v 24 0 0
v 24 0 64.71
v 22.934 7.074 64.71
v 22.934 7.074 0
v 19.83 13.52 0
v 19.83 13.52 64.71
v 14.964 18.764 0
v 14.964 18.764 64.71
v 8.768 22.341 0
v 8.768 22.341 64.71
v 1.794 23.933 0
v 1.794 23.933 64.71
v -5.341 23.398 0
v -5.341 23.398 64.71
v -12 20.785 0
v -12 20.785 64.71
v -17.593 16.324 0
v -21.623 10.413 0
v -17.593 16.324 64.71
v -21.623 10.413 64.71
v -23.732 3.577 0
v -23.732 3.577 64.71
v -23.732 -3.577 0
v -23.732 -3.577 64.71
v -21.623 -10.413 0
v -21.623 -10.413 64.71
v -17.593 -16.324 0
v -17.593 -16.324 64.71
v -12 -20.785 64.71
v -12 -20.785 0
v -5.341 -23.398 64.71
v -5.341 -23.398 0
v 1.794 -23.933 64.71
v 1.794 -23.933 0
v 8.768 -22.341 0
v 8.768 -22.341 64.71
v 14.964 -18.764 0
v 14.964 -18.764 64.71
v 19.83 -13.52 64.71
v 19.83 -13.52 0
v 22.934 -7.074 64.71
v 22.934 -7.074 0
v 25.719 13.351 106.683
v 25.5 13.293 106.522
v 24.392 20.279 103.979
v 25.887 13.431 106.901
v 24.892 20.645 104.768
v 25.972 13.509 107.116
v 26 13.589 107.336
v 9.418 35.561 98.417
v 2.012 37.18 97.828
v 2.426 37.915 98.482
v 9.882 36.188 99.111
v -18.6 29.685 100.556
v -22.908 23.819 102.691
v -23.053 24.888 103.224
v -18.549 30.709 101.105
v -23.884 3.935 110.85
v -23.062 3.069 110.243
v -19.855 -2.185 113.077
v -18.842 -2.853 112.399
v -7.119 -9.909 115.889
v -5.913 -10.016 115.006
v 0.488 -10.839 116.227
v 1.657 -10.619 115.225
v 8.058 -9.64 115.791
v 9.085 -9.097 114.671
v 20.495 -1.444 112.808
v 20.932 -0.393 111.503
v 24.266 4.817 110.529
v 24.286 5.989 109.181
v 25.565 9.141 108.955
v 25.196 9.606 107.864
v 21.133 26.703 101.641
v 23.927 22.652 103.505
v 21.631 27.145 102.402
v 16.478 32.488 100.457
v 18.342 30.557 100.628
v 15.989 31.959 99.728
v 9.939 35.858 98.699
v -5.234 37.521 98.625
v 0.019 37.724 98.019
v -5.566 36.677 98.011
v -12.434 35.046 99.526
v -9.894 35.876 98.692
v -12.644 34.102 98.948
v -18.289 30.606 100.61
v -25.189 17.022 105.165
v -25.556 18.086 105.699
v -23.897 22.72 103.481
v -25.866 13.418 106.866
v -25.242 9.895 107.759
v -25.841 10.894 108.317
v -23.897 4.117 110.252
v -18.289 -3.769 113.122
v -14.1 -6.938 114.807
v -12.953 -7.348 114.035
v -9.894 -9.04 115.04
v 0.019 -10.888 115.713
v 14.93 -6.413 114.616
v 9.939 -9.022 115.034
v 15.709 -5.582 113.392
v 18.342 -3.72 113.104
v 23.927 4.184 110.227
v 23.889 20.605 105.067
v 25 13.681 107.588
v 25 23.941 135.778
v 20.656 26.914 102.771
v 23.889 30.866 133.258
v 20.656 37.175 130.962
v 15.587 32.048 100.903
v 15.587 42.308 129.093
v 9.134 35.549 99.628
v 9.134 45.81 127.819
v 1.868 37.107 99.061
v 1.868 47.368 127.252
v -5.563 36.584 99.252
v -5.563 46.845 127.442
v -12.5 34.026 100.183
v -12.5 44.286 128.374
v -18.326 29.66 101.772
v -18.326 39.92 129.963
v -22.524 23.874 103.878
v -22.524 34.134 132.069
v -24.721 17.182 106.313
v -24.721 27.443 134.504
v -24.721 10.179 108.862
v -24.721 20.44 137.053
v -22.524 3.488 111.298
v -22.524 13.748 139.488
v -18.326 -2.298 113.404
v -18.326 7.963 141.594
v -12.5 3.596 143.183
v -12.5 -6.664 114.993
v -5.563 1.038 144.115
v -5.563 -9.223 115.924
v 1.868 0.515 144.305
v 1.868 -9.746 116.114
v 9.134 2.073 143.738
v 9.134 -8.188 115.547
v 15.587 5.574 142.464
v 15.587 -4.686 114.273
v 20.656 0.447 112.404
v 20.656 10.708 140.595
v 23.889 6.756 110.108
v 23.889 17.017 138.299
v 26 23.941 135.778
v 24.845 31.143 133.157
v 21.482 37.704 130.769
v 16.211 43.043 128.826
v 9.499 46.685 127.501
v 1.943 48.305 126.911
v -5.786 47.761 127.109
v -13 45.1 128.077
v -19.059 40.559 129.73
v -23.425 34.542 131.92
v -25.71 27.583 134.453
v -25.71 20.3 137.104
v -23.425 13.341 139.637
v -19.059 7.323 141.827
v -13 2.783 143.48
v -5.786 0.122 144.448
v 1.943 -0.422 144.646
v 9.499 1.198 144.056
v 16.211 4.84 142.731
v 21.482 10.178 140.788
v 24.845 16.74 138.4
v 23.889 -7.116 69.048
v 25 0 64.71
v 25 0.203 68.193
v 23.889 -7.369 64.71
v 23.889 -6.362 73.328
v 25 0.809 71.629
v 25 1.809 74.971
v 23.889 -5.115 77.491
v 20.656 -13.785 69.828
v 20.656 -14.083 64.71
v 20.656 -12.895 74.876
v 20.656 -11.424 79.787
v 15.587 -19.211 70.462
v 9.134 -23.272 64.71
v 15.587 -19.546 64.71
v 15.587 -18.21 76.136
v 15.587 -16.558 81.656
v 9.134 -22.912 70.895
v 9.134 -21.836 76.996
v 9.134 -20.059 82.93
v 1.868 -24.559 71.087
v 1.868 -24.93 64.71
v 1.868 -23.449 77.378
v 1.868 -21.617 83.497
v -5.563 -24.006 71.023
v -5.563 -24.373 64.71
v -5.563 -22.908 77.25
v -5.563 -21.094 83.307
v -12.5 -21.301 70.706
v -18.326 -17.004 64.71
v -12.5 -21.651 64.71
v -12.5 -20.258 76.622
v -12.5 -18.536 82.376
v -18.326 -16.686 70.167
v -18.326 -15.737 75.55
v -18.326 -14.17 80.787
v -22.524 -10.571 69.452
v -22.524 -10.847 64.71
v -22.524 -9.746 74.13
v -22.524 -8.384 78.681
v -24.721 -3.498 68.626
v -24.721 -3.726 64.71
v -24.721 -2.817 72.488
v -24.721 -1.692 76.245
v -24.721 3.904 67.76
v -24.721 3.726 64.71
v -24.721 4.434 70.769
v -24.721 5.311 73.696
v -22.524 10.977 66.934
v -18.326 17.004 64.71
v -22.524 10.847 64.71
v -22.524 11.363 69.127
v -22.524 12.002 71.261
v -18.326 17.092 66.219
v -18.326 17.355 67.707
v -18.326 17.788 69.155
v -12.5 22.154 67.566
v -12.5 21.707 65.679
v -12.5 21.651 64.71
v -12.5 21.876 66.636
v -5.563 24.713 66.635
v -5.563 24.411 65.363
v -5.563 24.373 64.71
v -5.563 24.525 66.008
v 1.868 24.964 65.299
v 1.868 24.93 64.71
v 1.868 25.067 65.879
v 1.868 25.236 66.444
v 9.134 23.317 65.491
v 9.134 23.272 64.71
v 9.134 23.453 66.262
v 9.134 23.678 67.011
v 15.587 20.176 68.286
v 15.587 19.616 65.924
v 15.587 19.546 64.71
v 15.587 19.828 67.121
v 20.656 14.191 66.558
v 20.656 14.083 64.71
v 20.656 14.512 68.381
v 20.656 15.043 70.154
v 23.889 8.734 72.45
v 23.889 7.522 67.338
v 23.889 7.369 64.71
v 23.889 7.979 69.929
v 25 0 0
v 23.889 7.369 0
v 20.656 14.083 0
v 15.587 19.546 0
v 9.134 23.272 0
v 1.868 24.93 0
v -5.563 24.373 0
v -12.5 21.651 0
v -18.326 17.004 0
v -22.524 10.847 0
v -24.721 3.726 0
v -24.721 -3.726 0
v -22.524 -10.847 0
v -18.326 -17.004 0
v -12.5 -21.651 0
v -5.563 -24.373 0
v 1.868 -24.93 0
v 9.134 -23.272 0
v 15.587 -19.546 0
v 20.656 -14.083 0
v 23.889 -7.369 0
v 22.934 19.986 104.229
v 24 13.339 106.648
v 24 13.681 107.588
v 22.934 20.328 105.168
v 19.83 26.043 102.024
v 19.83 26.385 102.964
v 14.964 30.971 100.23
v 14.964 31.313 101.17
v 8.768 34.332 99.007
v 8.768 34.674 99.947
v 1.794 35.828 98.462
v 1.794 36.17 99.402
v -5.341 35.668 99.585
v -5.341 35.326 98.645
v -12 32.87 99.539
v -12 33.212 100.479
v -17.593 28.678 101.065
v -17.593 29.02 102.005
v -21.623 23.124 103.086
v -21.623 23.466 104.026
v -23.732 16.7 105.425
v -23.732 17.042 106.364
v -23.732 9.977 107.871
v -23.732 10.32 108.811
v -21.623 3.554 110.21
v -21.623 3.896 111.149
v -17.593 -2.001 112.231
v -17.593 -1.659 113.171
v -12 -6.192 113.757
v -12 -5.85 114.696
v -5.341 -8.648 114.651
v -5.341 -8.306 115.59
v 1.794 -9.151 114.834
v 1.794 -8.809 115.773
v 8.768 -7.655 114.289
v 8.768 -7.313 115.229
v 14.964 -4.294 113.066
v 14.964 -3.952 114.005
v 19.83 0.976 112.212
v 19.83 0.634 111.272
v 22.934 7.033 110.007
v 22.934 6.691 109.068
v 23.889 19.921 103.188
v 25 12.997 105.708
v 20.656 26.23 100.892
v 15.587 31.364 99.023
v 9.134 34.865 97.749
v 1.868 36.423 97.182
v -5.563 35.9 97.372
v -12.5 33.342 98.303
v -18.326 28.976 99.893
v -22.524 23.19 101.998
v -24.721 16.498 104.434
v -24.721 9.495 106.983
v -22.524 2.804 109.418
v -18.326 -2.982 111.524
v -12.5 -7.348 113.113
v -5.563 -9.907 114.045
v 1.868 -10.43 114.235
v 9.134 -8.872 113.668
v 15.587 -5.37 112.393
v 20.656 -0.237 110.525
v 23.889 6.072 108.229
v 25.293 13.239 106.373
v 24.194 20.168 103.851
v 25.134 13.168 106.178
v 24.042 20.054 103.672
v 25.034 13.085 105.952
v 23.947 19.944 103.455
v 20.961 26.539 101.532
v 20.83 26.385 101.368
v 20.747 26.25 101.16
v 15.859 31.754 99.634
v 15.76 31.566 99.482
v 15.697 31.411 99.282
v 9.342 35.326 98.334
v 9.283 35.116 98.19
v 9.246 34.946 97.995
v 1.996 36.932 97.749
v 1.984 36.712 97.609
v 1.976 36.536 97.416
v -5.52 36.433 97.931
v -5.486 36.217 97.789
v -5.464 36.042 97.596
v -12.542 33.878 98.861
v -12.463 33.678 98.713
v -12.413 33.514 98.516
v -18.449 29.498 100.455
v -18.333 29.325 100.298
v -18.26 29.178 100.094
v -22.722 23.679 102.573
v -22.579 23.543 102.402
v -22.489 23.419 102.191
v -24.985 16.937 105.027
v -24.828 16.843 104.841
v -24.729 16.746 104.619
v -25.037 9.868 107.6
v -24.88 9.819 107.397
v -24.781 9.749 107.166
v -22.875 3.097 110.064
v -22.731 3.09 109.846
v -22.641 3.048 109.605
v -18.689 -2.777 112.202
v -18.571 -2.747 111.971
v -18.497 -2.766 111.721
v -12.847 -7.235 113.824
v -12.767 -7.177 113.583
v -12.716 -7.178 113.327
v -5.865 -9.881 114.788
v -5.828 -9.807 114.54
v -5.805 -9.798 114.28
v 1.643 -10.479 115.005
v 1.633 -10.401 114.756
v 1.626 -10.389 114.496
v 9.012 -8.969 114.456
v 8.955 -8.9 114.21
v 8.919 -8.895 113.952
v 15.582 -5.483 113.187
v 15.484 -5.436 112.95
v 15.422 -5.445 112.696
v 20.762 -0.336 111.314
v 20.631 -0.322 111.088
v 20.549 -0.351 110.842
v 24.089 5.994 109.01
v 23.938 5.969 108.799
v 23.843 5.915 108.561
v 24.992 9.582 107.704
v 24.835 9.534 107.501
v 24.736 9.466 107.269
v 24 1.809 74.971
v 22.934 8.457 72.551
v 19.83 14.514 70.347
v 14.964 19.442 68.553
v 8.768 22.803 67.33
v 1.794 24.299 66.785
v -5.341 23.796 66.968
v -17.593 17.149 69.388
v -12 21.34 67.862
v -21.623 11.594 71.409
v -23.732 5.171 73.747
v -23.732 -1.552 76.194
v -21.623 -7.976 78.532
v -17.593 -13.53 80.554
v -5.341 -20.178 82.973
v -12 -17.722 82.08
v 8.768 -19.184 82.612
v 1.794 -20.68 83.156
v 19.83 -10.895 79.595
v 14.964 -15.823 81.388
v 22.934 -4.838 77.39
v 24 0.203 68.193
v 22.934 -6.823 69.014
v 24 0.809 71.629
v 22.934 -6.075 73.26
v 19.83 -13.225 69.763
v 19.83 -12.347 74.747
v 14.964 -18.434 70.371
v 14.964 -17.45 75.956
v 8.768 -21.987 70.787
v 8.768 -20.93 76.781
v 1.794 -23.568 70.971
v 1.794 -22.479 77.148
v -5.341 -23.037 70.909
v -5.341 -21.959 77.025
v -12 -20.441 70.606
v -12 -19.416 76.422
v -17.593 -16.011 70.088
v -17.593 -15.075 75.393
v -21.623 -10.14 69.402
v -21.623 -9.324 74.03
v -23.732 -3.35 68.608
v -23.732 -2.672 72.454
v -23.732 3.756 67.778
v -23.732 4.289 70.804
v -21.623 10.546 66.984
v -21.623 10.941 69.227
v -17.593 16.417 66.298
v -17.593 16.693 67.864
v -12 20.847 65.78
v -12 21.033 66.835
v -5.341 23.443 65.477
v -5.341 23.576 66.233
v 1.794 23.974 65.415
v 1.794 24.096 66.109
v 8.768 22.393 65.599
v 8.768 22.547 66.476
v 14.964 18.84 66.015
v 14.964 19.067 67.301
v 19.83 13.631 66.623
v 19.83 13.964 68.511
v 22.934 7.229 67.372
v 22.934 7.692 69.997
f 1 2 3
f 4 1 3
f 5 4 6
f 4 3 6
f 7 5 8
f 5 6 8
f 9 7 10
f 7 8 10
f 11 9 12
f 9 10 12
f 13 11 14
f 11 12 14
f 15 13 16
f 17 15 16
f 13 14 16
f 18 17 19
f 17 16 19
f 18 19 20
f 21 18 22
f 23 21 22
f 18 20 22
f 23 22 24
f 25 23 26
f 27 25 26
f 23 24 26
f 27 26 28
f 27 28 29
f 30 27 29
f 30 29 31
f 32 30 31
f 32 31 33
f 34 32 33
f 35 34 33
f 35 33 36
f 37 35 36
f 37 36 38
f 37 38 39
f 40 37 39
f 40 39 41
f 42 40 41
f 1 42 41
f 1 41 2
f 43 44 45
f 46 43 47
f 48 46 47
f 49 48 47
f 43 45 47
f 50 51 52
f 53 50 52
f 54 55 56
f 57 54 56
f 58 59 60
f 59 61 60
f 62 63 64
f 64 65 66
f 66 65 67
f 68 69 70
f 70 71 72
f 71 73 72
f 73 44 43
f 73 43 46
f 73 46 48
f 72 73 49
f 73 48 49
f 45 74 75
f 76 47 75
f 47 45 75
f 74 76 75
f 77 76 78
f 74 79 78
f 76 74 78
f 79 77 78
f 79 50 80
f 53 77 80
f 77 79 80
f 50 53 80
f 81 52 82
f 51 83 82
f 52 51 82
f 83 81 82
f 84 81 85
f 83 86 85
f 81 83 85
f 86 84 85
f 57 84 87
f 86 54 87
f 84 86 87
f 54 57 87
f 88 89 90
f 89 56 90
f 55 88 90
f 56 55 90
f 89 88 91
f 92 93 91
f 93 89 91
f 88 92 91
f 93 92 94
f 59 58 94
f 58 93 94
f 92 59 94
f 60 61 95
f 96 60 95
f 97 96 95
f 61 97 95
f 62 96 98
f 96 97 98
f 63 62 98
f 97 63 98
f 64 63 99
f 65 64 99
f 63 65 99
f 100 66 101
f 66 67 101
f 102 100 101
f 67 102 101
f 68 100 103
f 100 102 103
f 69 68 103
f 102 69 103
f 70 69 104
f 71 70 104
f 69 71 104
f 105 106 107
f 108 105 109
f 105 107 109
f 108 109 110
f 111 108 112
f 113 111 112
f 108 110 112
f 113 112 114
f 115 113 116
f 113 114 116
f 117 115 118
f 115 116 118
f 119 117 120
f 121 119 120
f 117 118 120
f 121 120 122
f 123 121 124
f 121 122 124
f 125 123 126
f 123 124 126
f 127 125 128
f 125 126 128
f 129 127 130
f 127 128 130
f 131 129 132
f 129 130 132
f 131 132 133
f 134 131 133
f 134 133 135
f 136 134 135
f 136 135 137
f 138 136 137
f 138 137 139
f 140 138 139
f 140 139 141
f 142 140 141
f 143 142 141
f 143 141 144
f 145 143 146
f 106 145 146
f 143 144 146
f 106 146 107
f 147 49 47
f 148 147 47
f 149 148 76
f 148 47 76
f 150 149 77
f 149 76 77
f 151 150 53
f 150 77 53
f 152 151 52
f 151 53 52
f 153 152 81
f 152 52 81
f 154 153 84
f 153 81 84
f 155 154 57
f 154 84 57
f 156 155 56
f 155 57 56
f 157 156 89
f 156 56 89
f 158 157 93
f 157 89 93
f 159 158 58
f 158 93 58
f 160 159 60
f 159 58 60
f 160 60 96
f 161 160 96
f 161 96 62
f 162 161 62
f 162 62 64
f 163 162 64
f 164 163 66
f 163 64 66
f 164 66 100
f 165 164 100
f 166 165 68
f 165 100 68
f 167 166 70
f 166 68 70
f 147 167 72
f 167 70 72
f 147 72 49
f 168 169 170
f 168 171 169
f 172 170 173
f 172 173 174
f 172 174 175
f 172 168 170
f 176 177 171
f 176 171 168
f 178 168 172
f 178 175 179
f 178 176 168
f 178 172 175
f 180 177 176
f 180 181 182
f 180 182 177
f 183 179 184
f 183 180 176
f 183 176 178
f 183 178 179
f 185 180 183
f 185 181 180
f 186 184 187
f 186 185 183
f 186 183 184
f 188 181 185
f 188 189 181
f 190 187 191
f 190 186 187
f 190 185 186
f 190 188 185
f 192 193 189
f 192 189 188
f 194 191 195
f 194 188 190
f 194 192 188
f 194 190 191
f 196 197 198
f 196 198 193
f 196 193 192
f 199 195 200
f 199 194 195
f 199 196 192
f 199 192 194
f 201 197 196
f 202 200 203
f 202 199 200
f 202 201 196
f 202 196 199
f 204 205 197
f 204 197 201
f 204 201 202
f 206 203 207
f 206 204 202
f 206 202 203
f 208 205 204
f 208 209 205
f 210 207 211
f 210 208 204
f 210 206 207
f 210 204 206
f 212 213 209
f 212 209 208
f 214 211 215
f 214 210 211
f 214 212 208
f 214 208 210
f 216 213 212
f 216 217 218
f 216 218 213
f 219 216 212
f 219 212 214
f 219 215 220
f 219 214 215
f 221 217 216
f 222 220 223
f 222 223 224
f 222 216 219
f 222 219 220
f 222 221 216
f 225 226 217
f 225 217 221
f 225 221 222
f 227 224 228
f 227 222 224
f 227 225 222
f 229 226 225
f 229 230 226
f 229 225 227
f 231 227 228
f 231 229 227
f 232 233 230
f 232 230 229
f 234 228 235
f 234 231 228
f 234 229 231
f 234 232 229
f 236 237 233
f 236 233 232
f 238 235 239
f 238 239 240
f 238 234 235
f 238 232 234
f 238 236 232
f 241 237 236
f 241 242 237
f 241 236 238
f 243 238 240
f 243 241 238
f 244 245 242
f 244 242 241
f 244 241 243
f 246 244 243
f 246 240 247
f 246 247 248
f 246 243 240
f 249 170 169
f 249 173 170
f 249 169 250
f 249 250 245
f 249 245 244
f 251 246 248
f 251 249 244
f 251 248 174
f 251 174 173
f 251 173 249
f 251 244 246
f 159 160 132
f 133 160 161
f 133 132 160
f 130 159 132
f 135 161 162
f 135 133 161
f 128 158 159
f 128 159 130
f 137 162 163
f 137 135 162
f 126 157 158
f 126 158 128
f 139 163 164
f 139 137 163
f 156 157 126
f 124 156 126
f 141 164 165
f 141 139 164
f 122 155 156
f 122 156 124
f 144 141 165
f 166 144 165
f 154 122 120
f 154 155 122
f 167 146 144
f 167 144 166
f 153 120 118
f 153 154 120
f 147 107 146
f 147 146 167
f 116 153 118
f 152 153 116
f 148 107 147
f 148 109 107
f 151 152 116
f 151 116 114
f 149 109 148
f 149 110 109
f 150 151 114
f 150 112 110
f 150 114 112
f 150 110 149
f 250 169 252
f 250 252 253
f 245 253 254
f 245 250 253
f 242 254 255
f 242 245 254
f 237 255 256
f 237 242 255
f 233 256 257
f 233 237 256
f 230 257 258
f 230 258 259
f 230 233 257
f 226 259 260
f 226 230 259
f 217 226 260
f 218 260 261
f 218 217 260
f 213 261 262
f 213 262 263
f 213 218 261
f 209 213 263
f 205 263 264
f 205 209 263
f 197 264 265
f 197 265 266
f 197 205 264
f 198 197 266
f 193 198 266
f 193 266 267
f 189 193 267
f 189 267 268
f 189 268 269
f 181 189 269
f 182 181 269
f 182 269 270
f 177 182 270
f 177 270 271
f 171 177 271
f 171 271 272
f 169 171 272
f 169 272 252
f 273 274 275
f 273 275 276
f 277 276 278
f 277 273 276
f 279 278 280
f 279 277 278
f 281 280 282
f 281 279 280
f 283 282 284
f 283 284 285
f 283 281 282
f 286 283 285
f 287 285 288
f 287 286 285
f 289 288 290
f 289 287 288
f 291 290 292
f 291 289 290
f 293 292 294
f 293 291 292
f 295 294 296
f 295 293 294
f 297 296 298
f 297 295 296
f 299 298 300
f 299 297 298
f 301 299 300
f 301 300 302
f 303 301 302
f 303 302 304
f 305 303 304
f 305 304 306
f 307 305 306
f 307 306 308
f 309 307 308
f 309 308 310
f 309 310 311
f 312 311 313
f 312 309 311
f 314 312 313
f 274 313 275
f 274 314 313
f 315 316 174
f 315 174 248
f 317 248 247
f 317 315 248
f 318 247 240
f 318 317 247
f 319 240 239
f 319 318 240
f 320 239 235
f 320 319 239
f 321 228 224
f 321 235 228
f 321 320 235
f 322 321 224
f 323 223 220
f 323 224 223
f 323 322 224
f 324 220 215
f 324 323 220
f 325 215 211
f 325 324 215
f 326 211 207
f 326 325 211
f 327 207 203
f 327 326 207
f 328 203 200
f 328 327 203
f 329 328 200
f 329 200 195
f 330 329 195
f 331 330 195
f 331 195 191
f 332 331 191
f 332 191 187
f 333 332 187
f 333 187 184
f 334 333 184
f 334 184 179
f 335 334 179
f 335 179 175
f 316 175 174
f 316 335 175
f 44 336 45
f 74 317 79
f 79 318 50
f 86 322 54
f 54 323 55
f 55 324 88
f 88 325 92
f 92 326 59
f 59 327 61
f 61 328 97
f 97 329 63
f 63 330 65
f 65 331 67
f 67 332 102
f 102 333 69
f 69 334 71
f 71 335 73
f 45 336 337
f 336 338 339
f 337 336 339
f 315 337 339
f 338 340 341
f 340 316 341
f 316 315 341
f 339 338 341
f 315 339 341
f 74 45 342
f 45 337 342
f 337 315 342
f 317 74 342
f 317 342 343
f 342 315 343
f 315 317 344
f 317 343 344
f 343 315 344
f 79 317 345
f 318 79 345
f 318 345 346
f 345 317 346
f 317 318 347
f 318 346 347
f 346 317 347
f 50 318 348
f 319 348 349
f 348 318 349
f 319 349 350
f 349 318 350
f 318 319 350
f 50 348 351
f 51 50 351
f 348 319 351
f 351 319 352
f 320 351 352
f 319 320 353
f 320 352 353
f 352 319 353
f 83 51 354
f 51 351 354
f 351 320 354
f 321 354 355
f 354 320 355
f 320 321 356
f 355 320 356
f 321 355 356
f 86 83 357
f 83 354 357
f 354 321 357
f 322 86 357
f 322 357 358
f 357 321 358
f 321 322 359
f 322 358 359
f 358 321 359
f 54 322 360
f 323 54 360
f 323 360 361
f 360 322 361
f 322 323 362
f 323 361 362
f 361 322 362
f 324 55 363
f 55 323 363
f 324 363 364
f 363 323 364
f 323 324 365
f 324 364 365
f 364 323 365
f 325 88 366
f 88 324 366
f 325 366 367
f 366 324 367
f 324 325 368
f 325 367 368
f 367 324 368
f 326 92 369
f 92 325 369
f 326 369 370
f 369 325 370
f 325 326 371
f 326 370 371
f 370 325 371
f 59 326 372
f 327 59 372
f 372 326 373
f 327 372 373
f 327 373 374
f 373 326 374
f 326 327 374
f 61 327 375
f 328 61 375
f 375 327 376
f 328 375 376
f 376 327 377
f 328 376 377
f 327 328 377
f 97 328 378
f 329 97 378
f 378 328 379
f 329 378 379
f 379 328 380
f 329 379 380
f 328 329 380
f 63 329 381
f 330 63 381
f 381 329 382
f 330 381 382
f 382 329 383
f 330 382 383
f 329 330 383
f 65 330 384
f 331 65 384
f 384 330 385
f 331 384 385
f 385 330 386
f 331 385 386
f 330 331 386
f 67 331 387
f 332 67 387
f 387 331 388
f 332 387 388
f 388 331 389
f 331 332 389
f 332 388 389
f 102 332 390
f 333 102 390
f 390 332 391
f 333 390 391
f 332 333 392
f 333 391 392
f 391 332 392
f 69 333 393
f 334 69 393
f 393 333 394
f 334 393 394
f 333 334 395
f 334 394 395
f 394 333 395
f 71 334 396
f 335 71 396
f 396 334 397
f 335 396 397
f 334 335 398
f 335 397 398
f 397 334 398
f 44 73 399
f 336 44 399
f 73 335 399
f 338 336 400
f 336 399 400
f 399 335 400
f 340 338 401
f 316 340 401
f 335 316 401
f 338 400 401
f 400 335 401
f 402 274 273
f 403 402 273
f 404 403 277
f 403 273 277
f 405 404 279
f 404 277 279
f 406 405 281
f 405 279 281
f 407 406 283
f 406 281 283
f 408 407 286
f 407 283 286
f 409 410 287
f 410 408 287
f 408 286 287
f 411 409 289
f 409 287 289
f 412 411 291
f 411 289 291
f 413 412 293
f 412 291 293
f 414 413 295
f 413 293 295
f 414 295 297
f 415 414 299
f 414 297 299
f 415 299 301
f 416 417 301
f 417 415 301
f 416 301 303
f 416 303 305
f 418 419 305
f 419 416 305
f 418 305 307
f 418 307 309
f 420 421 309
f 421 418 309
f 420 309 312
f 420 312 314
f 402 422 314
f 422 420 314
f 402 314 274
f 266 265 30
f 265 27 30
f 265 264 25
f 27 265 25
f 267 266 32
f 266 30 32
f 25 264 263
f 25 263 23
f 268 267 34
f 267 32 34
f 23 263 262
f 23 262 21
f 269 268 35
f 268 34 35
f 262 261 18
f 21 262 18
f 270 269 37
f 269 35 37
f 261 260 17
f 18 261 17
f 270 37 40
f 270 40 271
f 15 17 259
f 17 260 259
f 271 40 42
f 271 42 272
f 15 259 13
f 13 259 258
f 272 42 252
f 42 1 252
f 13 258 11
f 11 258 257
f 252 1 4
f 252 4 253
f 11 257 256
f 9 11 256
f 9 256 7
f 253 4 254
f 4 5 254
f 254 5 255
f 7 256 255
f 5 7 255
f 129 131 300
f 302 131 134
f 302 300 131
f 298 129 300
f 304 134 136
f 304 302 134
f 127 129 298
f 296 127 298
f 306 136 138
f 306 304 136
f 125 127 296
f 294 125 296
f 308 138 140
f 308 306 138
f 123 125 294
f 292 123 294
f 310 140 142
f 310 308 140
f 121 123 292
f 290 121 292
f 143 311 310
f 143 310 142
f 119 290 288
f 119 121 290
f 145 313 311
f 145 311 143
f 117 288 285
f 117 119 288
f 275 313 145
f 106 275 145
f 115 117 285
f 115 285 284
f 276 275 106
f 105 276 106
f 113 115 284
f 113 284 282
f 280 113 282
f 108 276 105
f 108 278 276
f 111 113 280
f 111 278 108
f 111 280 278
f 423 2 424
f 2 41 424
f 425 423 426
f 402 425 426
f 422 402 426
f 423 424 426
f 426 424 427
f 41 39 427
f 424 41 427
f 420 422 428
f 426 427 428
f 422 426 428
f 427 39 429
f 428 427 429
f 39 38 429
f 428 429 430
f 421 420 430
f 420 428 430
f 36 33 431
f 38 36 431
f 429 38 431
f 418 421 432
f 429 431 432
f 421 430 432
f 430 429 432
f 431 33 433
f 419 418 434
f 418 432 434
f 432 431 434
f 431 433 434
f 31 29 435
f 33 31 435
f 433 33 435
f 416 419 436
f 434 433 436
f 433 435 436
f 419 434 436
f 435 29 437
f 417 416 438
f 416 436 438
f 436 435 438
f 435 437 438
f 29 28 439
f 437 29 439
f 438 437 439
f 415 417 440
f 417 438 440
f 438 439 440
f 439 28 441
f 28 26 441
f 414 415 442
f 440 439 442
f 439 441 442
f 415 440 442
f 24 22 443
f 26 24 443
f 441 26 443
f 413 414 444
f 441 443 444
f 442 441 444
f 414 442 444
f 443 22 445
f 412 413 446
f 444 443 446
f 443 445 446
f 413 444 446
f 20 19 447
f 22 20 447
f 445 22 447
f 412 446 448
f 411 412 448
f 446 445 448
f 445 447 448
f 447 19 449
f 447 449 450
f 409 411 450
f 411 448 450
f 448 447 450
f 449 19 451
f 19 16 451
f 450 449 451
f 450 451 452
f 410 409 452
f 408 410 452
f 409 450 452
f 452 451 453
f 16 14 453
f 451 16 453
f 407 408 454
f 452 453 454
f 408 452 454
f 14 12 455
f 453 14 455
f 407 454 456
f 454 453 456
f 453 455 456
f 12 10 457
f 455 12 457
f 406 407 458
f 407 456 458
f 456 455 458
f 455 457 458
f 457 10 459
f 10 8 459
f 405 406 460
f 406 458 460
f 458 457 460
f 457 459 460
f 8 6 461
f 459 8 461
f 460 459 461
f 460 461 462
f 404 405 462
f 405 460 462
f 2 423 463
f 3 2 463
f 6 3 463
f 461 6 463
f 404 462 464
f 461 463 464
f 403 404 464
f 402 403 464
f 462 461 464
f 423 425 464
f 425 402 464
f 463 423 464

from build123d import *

# Parameters (mm, degrees)
ESQUISSE6_R        = 25
ESQUISSE6_R_2      = 24
ESQUISSE8_R        = 26.000000000000004
ESQUISSE8_R_2      = 24.000000000000004
EXTRU_MINCE1_DEPTH = 1
EXTRU_MINCE2_START = 30
ESQUISSE9_R        = 26
ESQUISSE9_R_2      = 25
EXTRU_MINCE2_DEPTH = 30
CONG_1_R           = 1
CONG_2_R           = 1


with BuildPart() as part:
    # Balayage-Mince2: sweep along a path in Esquisse7
    with BuildLine(Plane(origin=(0, 0, 0), x_dir=(0, 0, -1), z_dir=(1, 0, 0))) as balayage_mince2_path:
        Line((0, 0), (-64.71019057874605, -6.94e-15))
        ThreePointArc((-64.71019057874605, -6.94e-15), (-69.91963590875396, 0.45576740963375073), (-74.97079487851613, 1.8092213764227365))
        Line((-74.97079487851613, 1.8092213764227365), (-106.64801221065042, 13.338785589701102))
    # Esquisse6 → Balayage-Mince2 (sweep)
    with BuildSketch(Plane.XY):
        Circle(ESQUISSE6_R)
        Circle(ESQUISSE6_R_2, mode=Mode.SUBTRACT)
    sweep(path=balayage_mince2_path.line)



with BuildPart() as body_2:
    # Esquisse8 → Extru.-Mince1 (new body)
    with BuildSketch(Plane(origin=(0, 35.836351928730004, 98.45956771981464), x_dir=(1, 0, 0), z_dir=(0, 0.34202014332566966, 0.9396926207859081))):
        with Locations((0, -23.94141003279684)):
            Circle(ESQUISSE8_R)
        with Locations((0, -23.94141003279684)):
            Circle(ESQUISSE8_R_2, mode=Mode.SUBTRACT)
    extrude(amount=EXTRU_MINCE1_DEPTH)


with BuildPart() as part_1:
    add(part.part)

    add(body_2.part)  # Extru.-Mince2 merges body 2
    # Esquisse9 → Extru.-Mince2 (add)
    with BuildSketch(Plane(origin=(0, 36.17837207205572, 99.39926034060053), x_dir=(1, 0, 0), z_dir=(0, 0.3420201433256696, 0.9396926207859081)).offset(EXTRU_MINCE2_START)):
        with Locations((0, -23.941410032796895)):
            Circle(ESQUISSE9_R)
        with Locations((0, -23.941410032796895)):
            Circle(ESQUISSE9_R_2, mode=Mode.SUBTRACT)
    extrude(amount=-EXTRU_MINCE2_DEPTH)

    # Congé1
    cong_1_edges = [part_1.edges().sort_by_distance(p)[0] for p in [
        (-25, 13.338785589701132, 106.6480122106504),
    ]]
    fillet(cong_1_edges, radius=CONG_1_R - 0.0001)  # a hair under: the kernel refuses the full size

    # Congé2
    cong_2_edges = [part_1.edges().sort_by_distance(p)[0] for p in [
        (-26.000000000000004, 13.33878558970111, 106.64801221065045),
    ]]
    fillet(cong_2_edges, radius=CONG_2_R)


solid = part_1.part
